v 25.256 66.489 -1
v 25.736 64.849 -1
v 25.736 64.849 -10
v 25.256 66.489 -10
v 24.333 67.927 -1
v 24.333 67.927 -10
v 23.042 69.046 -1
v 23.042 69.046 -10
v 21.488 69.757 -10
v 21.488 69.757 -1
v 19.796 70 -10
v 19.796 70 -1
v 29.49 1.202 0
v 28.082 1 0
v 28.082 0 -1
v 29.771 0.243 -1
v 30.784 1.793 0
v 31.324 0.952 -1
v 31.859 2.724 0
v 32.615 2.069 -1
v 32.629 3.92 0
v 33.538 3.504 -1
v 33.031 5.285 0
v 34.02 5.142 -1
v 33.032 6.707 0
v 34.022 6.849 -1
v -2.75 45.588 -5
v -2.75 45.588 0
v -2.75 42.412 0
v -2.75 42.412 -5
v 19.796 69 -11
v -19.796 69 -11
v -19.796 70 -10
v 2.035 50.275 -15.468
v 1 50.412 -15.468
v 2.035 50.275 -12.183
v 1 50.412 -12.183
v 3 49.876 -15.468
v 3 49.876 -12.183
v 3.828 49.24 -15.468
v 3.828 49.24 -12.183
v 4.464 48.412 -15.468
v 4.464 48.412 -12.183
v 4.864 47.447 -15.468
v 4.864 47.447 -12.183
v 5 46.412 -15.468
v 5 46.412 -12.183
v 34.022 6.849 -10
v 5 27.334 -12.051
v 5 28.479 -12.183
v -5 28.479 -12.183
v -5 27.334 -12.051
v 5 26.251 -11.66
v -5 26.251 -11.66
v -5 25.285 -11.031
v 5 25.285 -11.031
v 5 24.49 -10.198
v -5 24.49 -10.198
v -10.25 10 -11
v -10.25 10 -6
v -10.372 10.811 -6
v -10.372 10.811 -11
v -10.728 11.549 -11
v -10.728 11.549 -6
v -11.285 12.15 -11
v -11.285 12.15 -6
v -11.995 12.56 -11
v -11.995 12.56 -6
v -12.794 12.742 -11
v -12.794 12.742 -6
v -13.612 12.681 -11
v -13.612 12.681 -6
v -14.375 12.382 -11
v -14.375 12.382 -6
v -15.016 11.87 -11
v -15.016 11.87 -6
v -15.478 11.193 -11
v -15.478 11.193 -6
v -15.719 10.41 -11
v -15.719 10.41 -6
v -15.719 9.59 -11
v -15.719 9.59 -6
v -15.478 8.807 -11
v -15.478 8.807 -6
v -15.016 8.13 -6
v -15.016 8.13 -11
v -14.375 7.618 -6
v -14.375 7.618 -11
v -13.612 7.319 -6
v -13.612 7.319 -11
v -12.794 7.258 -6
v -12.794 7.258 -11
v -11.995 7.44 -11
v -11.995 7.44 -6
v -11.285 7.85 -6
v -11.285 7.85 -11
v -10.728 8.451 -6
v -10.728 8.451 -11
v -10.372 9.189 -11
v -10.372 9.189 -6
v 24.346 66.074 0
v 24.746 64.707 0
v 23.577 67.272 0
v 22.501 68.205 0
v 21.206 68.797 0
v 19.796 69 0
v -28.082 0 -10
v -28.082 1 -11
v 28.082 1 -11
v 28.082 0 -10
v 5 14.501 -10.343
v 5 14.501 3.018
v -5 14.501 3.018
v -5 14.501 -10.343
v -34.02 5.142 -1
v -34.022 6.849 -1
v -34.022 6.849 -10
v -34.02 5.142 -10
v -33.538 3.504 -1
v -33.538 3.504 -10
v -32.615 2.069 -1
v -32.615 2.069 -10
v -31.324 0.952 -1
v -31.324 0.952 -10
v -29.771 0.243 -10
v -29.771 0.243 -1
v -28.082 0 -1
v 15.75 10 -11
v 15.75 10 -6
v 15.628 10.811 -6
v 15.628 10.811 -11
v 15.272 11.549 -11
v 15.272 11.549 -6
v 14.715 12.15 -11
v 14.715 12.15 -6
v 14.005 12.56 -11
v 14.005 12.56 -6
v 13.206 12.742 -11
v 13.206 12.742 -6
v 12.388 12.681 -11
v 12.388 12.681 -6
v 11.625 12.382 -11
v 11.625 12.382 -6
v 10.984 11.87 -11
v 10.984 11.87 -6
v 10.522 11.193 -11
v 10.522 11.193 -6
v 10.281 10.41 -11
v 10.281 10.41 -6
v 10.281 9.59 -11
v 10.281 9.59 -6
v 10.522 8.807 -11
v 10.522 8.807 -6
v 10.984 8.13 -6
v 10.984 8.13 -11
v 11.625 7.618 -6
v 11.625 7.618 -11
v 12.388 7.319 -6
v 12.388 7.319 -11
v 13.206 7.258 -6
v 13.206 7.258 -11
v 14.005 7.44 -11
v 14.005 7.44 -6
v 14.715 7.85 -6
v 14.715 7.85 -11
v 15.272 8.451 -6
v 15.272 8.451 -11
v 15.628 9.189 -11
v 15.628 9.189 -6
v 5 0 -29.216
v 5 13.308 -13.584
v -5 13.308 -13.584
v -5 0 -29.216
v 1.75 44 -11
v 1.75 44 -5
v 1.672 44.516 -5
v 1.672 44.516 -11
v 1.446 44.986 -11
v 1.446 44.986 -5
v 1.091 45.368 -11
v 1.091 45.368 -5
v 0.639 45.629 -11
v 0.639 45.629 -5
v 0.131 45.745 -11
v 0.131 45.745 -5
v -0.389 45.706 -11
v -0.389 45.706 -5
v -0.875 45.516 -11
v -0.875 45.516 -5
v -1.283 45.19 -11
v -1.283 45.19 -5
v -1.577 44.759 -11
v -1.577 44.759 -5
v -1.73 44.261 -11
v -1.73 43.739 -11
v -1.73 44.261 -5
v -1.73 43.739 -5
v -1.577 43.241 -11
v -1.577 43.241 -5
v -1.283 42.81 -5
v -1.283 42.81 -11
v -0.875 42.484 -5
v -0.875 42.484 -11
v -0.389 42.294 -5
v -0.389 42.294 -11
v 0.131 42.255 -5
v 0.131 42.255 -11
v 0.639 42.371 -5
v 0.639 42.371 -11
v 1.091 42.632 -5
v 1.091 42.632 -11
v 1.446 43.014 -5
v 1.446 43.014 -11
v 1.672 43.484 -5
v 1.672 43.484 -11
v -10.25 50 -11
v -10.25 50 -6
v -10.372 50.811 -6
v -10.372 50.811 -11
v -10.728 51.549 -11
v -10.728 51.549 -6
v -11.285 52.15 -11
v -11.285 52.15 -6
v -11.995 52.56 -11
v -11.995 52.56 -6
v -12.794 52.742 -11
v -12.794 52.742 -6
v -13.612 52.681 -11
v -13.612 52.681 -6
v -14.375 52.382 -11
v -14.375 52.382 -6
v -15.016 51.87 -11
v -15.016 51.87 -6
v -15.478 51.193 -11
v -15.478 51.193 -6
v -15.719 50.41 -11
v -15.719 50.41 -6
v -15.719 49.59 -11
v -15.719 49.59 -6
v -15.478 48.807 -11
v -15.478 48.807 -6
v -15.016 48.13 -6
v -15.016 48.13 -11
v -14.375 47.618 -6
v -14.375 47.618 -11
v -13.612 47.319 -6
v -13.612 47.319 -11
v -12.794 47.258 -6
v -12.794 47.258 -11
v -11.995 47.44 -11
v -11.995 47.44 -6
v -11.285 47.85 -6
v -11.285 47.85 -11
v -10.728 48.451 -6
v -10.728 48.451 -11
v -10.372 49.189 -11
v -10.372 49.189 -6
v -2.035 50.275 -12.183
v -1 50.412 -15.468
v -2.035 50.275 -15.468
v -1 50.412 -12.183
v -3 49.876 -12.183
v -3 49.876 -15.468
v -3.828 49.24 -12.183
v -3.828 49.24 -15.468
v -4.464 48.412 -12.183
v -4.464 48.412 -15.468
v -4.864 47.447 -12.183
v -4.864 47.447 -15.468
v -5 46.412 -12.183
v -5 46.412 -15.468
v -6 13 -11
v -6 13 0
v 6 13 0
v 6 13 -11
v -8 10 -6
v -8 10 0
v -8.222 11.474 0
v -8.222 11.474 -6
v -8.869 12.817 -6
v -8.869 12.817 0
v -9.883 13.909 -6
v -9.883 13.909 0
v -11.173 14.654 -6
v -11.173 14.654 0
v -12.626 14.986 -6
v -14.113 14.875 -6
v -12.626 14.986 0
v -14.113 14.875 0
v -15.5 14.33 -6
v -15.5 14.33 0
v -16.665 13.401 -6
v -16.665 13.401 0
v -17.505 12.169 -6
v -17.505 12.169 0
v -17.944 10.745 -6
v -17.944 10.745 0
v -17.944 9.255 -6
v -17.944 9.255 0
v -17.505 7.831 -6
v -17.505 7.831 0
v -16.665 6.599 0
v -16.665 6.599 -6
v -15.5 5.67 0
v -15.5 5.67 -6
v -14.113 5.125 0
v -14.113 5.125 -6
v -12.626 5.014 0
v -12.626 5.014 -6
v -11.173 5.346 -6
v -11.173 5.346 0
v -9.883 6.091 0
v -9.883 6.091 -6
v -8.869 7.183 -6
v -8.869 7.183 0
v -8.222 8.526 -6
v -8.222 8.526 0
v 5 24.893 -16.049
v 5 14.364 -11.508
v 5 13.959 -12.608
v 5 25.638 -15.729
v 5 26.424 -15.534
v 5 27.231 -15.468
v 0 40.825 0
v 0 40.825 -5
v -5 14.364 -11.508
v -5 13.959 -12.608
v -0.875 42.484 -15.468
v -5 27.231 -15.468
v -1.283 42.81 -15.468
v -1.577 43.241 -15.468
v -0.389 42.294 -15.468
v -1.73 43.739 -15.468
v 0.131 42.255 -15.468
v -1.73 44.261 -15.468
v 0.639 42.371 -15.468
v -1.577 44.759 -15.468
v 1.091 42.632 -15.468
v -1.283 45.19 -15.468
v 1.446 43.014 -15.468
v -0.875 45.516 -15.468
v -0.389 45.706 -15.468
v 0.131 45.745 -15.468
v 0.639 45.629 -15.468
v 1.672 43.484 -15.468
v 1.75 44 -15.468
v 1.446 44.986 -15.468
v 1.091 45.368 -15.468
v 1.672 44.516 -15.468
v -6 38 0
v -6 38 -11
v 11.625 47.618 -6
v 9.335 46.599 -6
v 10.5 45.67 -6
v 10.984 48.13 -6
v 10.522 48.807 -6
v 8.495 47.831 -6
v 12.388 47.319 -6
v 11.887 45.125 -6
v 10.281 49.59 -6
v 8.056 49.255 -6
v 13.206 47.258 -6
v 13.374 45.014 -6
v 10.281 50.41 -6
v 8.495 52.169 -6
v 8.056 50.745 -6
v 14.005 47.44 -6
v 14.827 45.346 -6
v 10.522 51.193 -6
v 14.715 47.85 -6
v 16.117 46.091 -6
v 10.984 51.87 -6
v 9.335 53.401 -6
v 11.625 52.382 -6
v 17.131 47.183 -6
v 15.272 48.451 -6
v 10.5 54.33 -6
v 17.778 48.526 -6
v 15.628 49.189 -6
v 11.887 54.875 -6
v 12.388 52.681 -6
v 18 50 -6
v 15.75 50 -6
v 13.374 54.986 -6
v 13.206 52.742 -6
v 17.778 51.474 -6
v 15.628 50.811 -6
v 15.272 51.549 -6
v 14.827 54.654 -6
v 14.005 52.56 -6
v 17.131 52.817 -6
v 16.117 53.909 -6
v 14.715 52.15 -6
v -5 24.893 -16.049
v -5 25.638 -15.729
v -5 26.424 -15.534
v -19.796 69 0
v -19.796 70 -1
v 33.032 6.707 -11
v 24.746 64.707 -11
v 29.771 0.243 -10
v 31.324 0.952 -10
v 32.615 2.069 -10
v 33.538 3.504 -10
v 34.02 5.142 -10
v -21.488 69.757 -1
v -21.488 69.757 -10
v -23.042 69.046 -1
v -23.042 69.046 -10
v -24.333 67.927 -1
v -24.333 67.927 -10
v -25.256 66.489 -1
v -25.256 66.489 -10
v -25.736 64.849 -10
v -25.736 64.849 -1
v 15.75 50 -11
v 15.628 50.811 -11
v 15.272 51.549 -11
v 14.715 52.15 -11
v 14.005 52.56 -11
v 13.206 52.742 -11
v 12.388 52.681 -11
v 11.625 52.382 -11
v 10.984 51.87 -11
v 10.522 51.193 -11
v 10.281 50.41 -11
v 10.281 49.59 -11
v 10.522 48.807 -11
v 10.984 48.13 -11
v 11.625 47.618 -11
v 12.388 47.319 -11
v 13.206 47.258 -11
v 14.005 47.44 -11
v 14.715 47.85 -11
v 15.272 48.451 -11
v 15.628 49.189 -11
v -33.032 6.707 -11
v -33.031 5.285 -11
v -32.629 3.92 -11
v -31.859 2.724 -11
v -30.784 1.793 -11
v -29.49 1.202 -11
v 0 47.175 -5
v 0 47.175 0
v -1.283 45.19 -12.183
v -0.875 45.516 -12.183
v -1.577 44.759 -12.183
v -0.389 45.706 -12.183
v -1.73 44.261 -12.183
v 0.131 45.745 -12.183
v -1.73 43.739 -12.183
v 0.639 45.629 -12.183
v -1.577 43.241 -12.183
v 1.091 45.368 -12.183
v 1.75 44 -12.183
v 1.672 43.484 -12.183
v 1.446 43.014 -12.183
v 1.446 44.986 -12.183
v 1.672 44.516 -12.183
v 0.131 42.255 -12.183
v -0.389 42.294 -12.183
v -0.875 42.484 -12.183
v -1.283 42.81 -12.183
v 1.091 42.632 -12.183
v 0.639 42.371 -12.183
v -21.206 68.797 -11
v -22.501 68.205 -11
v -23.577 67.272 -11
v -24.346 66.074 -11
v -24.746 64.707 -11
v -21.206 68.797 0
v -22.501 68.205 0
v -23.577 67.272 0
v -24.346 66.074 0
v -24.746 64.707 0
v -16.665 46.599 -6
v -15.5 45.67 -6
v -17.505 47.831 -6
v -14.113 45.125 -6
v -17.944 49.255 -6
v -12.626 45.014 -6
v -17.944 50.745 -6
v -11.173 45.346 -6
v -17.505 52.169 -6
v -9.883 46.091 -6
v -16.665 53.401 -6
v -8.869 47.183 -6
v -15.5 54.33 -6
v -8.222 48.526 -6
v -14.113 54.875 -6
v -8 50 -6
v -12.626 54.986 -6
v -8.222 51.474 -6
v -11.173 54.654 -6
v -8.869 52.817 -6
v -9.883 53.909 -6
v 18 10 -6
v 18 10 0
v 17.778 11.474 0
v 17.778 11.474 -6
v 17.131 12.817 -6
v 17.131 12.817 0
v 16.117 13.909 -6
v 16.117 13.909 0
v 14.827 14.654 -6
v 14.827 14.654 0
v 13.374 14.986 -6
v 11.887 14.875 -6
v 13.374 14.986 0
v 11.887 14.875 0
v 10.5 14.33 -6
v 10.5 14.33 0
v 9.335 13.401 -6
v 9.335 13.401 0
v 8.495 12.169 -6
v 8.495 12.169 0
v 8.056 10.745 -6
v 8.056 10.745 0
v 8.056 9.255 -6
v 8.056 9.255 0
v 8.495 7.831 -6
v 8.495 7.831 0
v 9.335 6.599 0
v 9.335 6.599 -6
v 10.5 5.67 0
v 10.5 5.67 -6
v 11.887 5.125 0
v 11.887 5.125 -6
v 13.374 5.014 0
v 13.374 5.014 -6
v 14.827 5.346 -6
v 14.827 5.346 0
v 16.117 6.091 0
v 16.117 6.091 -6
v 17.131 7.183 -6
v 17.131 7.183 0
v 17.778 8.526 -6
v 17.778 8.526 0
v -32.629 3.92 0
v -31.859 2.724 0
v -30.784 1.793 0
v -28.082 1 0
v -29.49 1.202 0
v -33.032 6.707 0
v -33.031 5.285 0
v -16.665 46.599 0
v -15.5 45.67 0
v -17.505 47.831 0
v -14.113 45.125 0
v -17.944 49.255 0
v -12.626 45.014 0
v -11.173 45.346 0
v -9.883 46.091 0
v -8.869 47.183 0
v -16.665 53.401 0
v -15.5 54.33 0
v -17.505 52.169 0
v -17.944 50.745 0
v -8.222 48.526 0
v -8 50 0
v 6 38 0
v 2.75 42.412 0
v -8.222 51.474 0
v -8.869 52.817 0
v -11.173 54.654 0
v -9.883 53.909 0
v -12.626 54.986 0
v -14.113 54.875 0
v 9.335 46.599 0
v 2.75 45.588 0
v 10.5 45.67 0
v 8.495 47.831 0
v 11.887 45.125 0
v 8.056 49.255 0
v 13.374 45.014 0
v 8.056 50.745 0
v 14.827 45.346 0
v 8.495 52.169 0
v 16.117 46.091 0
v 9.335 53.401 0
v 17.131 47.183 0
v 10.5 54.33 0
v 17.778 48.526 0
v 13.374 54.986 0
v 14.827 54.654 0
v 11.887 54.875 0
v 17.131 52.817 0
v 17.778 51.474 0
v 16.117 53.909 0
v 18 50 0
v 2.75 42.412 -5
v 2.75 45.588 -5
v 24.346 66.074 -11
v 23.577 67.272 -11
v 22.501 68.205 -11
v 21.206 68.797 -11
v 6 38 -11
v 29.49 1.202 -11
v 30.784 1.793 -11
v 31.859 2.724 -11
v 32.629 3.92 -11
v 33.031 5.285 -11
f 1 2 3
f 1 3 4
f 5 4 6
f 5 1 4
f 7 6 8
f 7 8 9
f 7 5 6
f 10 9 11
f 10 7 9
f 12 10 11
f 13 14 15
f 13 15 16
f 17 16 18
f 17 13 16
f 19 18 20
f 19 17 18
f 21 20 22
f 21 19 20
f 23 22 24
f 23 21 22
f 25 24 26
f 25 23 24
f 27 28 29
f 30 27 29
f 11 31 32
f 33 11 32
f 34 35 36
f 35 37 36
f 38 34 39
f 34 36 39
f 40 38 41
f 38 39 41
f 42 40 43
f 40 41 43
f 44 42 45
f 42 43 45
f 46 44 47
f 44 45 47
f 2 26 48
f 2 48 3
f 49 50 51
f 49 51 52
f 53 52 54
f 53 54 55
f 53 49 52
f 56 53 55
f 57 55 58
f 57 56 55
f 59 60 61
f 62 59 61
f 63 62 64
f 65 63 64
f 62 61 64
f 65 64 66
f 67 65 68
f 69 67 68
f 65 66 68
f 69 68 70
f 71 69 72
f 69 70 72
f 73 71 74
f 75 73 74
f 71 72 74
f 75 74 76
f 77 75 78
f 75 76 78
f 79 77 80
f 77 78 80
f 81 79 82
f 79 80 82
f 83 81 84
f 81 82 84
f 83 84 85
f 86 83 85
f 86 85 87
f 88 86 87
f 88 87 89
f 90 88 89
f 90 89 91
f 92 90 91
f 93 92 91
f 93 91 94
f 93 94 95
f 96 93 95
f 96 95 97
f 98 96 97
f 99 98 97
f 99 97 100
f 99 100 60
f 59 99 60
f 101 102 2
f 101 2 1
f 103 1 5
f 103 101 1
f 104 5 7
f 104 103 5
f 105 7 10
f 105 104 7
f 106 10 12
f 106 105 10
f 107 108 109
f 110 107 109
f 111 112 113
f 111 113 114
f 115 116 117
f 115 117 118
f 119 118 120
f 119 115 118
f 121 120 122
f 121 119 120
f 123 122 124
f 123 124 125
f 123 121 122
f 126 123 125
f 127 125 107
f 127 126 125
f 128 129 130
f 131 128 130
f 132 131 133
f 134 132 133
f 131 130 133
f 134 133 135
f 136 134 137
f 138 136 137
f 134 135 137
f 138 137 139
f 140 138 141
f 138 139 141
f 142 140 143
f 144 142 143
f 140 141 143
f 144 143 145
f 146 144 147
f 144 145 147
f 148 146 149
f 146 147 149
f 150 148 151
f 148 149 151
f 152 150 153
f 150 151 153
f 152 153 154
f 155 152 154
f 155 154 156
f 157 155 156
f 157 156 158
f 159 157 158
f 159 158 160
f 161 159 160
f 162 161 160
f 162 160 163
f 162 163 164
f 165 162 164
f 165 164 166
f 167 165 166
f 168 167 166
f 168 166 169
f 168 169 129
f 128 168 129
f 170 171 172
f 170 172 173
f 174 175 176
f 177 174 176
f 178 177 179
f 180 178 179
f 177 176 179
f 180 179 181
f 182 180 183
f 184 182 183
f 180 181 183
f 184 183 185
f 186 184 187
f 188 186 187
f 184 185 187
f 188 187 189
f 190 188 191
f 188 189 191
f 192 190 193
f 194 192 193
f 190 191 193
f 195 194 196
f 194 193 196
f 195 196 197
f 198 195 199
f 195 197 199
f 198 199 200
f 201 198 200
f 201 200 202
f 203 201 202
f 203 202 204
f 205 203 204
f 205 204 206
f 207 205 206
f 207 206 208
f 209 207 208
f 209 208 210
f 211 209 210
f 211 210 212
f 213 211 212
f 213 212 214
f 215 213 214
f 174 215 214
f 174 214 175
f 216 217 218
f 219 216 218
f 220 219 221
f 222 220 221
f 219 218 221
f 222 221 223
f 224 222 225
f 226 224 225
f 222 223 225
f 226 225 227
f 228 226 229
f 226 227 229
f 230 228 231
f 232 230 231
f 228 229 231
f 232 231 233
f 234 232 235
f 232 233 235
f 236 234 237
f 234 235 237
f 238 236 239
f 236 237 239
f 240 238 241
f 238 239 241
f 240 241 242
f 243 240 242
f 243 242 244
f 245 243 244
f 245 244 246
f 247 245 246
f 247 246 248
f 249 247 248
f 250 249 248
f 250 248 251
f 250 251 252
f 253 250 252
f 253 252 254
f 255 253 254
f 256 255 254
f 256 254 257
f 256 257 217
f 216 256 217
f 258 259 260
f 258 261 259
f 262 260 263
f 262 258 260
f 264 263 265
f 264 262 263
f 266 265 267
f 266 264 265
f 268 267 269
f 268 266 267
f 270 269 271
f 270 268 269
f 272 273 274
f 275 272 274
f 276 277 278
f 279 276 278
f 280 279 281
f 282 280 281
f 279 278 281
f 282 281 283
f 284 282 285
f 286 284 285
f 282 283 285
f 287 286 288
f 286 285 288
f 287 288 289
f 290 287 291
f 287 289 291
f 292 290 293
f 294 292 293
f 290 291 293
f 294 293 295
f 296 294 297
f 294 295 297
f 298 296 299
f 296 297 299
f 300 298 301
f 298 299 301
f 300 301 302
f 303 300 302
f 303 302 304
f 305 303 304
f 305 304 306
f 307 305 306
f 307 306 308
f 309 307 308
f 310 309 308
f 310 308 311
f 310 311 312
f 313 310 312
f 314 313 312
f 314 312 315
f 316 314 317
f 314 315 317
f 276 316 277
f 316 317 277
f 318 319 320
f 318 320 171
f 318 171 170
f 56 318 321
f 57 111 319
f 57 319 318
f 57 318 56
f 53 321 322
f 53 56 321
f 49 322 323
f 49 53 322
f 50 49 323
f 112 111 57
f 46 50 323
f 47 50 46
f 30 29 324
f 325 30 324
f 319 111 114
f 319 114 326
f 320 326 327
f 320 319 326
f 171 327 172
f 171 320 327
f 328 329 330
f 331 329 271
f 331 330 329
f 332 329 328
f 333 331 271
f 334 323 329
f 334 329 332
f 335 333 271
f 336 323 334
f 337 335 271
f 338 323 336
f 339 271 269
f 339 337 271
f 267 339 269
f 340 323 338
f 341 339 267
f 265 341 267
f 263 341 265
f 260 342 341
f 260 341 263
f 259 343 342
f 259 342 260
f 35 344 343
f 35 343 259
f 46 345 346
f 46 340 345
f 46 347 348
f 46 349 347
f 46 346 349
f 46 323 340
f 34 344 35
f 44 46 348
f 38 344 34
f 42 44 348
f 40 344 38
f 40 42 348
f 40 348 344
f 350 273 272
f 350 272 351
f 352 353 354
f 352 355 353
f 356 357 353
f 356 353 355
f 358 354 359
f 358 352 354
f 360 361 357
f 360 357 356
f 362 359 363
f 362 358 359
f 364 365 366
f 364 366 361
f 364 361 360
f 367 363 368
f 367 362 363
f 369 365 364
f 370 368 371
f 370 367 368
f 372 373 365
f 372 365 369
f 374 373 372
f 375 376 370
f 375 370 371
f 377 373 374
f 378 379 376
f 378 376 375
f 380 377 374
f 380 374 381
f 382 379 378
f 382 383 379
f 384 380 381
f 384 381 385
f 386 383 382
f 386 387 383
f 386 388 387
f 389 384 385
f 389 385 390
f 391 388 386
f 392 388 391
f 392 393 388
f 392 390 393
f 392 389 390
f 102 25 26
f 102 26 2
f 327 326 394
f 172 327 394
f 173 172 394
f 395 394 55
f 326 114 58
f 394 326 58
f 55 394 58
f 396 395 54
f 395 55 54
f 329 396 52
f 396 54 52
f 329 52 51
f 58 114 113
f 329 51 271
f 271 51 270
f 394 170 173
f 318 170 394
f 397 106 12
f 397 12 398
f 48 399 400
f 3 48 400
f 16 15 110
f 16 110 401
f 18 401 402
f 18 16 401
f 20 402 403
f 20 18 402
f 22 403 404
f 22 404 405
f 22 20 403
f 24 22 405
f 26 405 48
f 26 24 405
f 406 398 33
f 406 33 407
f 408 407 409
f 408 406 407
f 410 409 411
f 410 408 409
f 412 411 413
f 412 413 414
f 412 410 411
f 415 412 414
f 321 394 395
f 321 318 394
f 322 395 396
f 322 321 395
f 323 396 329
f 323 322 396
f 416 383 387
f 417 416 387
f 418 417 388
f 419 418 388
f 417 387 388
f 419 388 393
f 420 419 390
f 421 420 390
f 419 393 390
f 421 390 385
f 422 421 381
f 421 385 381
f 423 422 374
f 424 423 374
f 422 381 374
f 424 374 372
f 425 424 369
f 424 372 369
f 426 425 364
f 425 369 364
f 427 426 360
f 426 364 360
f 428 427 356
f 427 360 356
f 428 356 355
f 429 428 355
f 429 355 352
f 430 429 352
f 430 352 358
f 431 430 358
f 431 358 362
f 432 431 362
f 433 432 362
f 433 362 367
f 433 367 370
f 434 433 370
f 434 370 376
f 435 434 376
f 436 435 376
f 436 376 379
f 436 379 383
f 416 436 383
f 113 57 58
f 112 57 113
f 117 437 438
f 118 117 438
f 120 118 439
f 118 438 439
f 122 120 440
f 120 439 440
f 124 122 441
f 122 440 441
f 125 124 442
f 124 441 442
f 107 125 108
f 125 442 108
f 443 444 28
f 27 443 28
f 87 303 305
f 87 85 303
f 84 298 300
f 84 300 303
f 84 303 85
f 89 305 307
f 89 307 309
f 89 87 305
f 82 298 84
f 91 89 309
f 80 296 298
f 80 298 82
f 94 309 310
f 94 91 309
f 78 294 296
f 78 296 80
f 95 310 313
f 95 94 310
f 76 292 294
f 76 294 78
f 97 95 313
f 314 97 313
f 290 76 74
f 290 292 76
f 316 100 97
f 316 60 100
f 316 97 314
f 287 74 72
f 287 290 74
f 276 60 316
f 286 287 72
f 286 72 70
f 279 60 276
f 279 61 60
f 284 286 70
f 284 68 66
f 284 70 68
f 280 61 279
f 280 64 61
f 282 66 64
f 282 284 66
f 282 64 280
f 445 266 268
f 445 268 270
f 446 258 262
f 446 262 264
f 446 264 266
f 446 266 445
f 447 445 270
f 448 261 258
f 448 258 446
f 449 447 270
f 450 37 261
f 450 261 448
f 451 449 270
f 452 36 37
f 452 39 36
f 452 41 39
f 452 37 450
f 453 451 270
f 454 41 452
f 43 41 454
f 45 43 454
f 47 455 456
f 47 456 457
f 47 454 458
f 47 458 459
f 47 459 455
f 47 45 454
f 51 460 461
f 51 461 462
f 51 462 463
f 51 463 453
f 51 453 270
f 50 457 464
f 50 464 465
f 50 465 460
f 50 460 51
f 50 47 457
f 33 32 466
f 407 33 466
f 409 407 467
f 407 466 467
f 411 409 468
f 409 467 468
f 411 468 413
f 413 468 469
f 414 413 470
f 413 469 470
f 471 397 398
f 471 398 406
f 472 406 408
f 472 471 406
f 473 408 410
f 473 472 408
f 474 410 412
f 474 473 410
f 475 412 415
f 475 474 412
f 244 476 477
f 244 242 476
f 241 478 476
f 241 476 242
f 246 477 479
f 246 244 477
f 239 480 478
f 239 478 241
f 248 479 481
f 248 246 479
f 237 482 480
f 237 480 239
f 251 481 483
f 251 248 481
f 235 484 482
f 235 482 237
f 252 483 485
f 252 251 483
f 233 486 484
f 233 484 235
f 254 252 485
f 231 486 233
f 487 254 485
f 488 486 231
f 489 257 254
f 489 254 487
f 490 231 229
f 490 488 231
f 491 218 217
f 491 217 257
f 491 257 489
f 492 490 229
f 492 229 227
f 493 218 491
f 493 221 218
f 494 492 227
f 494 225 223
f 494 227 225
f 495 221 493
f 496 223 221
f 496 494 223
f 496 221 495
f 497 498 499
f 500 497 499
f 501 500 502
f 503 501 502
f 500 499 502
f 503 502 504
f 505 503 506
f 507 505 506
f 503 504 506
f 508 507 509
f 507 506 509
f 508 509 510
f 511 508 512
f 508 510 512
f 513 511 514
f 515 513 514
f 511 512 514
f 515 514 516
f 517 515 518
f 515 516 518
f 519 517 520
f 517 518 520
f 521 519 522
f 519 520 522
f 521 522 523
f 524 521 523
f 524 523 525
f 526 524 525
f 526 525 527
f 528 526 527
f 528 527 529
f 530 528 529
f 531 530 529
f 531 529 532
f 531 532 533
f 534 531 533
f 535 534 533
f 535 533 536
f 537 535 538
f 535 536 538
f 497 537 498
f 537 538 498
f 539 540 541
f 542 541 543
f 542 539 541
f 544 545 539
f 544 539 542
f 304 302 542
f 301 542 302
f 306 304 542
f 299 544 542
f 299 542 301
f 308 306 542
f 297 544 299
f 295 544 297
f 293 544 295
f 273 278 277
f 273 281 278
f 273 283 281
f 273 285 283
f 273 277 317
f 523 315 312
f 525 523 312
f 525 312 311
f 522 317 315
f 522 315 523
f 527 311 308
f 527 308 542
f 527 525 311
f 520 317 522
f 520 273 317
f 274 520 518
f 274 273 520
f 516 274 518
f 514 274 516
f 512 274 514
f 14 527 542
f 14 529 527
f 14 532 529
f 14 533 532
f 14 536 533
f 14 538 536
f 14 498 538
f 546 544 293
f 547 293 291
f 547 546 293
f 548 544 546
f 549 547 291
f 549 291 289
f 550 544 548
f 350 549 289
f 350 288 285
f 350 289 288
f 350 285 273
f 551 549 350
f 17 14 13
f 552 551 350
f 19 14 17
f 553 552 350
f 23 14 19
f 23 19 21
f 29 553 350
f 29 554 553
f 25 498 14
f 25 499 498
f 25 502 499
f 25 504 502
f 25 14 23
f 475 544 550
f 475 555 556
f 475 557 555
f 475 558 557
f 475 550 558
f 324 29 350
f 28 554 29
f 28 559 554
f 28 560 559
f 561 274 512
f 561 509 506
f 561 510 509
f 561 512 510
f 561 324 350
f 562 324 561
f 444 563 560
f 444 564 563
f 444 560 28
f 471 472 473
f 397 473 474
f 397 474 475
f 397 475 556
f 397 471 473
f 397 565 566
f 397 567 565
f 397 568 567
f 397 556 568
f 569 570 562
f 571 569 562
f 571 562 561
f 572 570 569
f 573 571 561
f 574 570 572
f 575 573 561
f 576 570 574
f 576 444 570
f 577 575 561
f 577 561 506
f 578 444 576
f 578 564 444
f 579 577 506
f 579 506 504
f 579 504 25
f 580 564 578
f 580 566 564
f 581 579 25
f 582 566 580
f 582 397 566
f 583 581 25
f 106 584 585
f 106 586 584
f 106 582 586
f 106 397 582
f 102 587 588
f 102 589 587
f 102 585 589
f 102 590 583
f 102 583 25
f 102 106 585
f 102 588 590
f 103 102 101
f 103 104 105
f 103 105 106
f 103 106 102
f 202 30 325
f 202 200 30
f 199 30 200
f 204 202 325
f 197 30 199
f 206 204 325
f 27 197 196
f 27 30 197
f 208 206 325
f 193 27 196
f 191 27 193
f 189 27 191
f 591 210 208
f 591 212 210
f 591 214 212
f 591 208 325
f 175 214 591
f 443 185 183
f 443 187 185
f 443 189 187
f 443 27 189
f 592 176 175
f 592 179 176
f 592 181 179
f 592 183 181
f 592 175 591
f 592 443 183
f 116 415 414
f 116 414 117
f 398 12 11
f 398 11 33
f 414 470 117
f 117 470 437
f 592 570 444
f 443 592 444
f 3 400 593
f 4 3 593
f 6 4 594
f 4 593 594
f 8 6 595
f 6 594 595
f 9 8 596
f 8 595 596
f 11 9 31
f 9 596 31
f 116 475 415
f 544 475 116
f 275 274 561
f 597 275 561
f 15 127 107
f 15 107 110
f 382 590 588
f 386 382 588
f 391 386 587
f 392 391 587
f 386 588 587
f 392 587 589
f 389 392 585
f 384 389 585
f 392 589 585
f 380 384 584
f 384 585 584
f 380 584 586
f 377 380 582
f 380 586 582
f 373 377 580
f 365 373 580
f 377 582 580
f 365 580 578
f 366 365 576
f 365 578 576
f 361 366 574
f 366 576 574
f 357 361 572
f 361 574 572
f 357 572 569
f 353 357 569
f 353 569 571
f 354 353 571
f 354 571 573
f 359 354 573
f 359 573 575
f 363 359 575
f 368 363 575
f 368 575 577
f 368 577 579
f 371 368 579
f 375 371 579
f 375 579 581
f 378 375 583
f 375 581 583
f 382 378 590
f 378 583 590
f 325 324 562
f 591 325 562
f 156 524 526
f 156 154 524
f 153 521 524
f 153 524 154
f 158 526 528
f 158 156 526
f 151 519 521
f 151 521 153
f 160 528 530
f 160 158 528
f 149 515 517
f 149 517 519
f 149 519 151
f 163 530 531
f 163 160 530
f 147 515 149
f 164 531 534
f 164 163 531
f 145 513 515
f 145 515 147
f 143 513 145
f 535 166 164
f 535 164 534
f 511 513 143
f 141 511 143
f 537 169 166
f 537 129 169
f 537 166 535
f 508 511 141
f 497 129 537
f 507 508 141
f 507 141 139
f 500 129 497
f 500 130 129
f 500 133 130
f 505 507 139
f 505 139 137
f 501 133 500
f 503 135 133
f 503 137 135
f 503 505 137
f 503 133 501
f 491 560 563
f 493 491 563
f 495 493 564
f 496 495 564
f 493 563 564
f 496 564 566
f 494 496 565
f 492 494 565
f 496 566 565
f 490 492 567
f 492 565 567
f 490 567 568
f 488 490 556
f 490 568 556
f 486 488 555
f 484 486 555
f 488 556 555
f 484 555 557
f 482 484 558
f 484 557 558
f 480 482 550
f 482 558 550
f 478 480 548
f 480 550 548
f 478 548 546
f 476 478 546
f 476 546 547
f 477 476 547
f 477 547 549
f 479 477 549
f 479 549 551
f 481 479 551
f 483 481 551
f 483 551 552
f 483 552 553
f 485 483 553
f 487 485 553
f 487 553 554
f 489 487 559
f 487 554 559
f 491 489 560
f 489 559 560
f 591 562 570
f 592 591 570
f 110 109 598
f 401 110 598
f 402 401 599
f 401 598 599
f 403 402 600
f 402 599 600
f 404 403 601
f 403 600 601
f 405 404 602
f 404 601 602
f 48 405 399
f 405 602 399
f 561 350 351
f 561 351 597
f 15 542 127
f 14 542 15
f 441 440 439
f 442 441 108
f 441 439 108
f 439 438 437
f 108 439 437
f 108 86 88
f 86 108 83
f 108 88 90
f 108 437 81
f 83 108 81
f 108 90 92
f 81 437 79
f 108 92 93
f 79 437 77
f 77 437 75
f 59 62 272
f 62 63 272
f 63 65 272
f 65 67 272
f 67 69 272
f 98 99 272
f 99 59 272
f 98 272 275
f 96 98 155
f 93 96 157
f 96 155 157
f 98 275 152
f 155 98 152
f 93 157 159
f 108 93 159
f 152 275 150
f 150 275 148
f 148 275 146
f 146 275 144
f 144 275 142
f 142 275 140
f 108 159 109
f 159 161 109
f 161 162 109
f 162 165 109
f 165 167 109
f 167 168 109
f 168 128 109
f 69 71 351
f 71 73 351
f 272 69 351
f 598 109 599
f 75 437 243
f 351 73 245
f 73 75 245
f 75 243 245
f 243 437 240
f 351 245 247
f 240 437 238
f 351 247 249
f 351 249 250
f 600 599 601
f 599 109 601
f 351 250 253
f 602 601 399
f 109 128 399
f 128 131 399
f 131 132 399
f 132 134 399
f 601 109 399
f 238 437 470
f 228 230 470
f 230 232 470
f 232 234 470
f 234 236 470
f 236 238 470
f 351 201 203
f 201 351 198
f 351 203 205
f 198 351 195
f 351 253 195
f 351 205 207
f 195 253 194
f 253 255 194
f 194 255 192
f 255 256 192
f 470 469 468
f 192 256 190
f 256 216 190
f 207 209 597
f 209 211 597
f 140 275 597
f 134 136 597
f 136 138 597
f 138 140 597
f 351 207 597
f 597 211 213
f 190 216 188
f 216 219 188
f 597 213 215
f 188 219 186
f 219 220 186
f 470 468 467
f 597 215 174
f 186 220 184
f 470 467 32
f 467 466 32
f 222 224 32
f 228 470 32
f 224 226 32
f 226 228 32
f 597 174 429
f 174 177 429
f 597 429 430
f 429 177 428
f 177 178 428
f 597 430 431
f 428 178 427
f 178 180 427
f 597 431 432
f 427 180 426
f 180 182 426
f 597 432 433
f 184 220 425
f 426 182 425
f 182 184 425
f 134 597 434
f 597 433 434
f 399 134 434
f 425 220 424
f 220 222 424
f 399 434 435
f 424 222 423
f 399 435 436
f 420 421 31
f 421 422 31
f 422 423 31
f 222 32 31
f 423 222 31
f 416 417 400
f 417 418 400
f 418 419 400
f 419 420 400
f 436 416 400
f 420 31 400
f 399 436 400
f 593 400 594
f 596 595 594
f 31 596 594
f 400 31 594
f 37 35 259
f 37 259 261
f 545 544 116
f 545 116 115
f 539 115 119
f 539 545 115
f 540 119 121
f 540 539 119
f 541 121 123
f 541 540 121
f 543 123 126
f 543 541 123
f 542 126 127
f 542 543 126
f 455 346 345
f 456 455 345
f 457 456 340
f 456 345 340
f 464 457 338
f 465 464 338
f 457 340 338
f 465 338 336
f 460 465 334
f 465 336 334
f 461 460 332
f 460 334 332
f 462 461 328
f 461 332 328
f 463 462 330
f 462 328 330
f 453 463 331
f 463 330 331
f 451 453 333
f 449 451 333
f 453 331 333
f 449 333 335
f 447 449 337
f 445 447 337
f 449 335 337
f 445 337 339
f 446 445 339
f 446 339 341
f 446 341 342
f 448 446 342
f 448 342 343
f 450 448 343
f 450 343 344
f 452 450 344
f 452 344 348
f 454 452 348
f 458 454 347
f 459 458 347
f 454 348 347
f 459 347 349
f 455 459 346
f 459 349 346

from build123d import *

# Parameters (mm, degrees)
F0_R      = 5
F0_W      = 12
F0_H      = 25
F0_R_2    = 1.75
F0_R_3    = 2.75
F1_DEPTH  = 11
F2_SIZE   = 1
F3_SIZE   = 1
F4_DEPTH  = 6
F6_DEPTH  = 5
F8_R      = 4
F7_R      = 1.75
F9_DEPTH  = 3.2850317657
F10_R     = 1.75
F11_DEPTH = 5


with BuildPart() as f1:
    # F0 (on Top) → F1 (new body)
    with BuildSketch(Plane.XY):
        with BuildLine():
            ThreePointArc((-34.0216388375, 6.8485281374), (-32.6146656055, 2.0687895518), (-28.0819418755, 0))
            Line((-28.0819418755, 0), (28.0819418755, 0))
            ThreePointArc((28.0819418755, 0), (32.6146656055, 2.0687895518), (34.0216388375, 6.8485281374))
            Line((34.0216388375, 6.8485281374), (25.7359245518, 64.8485281374))
            ThreePointArc((25.7359245518, 64.8485281374), (23.727438038, 68.53272373), (19.7962275898, 70))
            Line((19.7962275898, 70), (-19.7962275898, 70))
            ThreePointArc((-19.7962275898, 70), (-23.727438038, 68.53272373), (-25.7359245518, 64.8485281374))
            Line((-25.7359245518, 64.8485281374), (-34.0216388375, 6.8485281374))
        make_face()
        with Locations((-13, 10)):
            Circle(F0_R, mode=Mode.SUBTRACT)
        with Locations((0, 25.5)):
            Rectangle(F0_W, F0_H, mode=Mode.SUBTRACT)
        with Locations((13, 10)):
            Circle(F0_R, mode=Mode.SUBTRACT)
        with Locations((-13, 50)):
            Circle(F0_R, mode=Mode.SUBTRACT)
        with Locations((0, 44)):
            Circle(F0_R_2, mode=Mode.SUBTRACT)
        with Locations((13, 50)):
            Circle(F0_R, mode=Mode.SUBTRACT)
        with Locations((13, 50)):
            Circle(F0_R)
        with Locations((13, 50)):
            Circle(F0_R_3, mode=Mode.SUBTRACT)
        with Locations((13, 10)):
            Circle(F0_R)
        with Locations((13, 10)):
            Circle(F0_R_3, mode=Mode.SUBTRACT)
        with Locations((-13, 10)):
            Circle(F0_R)
        with Locations((-13, 10)):
            Circle(F0_R_3, mode=Mode.SUBTRACT)
        with Locations((-13, 50)):
            Circle(F0_R)
        with Locations((-13, 50)):
            Circle(F0_R_3, mode=Mode.SUBTRACT)
    extrude(amount=-F1_DEPTH)

    # F2
    f2_edges = [f1.edges().sort_by_distance(p)[0] for p in [
        (29.878782, 35.848528, 0),
    ]]
    chamfer(f2_edges, length=F2_SIZE)

    # F3
    f3_edges = [f1.edges().sort_by_distance(p)[0] for p in [
        (-29.878782, 35.848528, -11),
    ]]
    chamfer(f3_edges, length=F3_SIZE)

    # F0 (on Top) → F4 (cut)
    with BuildSketch(Plane.XY):
        with Locations((-13, 50)):
            Circle(F0_R)
        with Locations((-13, 50)):
            Circle(F0_R_3, mode=Mode.SUBTRACT)
        with Locations((13, 50)):
            Circle(F0_R)
        with Locations((13, 50)):
            Circle(F0_R_3, mode=Mode.SUBTRACT)
        with Locations((13, 10)):
            Circle(F0_R)
        with Locations((13, 10)):
            Circle(F0_R_3, mode=Mode.SUBTRACT)
        with Locations((-13, 10)):
            Circle(F0_R)
        with Locations((-13, 10)):
            Circle(F0_R_3, mode=Mode.SUBTRACT)
    extrude(amount=-F4_DEPTH, mode=Mode.SUBTRACT)

    # F10 (on face) → F11 (cut)
    with BuildSketch(Plane.XY):
        Polygon((2.75, 42.4122867597), (2.75, 45.5877132403), (0, 47.1754264805), (-2.75, 45.5877132403), (-2.75, 42.4122867597), (0, 40.8245735195), align=None)
        with Locations((0, 44)):
            Circle(F10_R, mode=Mode.SUBTRACT)
    extrude(amount=-F11_DEPTH, mode=Mode.SUBTRACT)


with BuildPart() as f6:
    # F5 (on Right) → F6 (new body, symmetric)
    with BuildSketch(Plane.YZ):
        with BuildLine():
            Line((50.4115372896, -15.4683683068), (50.4115372896, -12.1833365411))
            Line((50.4115372896, -12.1833365411), (28.478592073, -12.1833365411))
            ThreePointArc((28.478592073, -12.1833365411), (26.2507662739, -11.6595841), (24.4896721551, -10.1980534247))
            Line((24.4896721551, -10.1980534247), (14.5013537258, 3.017981071))
            Line((14.5013537258, 3.017981071), (14.5013537258, -10.3431800478))
            ThreePointArc((14.5013537258, -10.3431800478), (14.1936622933, -12.0700964636), (13.3084576029, -13.5844699251))
            Line((13.3084576029, -13.5844699251), (0, -29.216111172))
            Line((0, -29.216111172), (24.8931582504, -16.0486049021))
            ThreePointArc((24.8931582504, -16.0486049021), (26.0266350445, -15.6155950263), (27.2310400795, -15.4683683068))
            Line((27.2310400795, -15.4683683068), (50.4115372896, -15.4683683068))
        make_face()
    extrude(amount=F6_DEPTH, both=True)

    # F8
    f8_edges = [f6.edges().sort_by_distance(p)[0] for p in [
        (5, 50.411537, -13.825852),
        (-5, 50.411537, -13.825852),
    ]]
    fillet(f8_edges, radius=F8_R)

    # F7 (on face) → F9 (cut, through all)
    with BuildSketch(Plane(origin=(0, 0, -15.4683683068), x_dir=(1, 0, 0), z_dir=(0, 0, -1))):
        with Locations((0, -44)):
            Circle(F7_R)
    extrude(amount=-F9_DEPTH, mode=Mode.SUBTRACT)


solid = Compound([f1.part, f6.part])
